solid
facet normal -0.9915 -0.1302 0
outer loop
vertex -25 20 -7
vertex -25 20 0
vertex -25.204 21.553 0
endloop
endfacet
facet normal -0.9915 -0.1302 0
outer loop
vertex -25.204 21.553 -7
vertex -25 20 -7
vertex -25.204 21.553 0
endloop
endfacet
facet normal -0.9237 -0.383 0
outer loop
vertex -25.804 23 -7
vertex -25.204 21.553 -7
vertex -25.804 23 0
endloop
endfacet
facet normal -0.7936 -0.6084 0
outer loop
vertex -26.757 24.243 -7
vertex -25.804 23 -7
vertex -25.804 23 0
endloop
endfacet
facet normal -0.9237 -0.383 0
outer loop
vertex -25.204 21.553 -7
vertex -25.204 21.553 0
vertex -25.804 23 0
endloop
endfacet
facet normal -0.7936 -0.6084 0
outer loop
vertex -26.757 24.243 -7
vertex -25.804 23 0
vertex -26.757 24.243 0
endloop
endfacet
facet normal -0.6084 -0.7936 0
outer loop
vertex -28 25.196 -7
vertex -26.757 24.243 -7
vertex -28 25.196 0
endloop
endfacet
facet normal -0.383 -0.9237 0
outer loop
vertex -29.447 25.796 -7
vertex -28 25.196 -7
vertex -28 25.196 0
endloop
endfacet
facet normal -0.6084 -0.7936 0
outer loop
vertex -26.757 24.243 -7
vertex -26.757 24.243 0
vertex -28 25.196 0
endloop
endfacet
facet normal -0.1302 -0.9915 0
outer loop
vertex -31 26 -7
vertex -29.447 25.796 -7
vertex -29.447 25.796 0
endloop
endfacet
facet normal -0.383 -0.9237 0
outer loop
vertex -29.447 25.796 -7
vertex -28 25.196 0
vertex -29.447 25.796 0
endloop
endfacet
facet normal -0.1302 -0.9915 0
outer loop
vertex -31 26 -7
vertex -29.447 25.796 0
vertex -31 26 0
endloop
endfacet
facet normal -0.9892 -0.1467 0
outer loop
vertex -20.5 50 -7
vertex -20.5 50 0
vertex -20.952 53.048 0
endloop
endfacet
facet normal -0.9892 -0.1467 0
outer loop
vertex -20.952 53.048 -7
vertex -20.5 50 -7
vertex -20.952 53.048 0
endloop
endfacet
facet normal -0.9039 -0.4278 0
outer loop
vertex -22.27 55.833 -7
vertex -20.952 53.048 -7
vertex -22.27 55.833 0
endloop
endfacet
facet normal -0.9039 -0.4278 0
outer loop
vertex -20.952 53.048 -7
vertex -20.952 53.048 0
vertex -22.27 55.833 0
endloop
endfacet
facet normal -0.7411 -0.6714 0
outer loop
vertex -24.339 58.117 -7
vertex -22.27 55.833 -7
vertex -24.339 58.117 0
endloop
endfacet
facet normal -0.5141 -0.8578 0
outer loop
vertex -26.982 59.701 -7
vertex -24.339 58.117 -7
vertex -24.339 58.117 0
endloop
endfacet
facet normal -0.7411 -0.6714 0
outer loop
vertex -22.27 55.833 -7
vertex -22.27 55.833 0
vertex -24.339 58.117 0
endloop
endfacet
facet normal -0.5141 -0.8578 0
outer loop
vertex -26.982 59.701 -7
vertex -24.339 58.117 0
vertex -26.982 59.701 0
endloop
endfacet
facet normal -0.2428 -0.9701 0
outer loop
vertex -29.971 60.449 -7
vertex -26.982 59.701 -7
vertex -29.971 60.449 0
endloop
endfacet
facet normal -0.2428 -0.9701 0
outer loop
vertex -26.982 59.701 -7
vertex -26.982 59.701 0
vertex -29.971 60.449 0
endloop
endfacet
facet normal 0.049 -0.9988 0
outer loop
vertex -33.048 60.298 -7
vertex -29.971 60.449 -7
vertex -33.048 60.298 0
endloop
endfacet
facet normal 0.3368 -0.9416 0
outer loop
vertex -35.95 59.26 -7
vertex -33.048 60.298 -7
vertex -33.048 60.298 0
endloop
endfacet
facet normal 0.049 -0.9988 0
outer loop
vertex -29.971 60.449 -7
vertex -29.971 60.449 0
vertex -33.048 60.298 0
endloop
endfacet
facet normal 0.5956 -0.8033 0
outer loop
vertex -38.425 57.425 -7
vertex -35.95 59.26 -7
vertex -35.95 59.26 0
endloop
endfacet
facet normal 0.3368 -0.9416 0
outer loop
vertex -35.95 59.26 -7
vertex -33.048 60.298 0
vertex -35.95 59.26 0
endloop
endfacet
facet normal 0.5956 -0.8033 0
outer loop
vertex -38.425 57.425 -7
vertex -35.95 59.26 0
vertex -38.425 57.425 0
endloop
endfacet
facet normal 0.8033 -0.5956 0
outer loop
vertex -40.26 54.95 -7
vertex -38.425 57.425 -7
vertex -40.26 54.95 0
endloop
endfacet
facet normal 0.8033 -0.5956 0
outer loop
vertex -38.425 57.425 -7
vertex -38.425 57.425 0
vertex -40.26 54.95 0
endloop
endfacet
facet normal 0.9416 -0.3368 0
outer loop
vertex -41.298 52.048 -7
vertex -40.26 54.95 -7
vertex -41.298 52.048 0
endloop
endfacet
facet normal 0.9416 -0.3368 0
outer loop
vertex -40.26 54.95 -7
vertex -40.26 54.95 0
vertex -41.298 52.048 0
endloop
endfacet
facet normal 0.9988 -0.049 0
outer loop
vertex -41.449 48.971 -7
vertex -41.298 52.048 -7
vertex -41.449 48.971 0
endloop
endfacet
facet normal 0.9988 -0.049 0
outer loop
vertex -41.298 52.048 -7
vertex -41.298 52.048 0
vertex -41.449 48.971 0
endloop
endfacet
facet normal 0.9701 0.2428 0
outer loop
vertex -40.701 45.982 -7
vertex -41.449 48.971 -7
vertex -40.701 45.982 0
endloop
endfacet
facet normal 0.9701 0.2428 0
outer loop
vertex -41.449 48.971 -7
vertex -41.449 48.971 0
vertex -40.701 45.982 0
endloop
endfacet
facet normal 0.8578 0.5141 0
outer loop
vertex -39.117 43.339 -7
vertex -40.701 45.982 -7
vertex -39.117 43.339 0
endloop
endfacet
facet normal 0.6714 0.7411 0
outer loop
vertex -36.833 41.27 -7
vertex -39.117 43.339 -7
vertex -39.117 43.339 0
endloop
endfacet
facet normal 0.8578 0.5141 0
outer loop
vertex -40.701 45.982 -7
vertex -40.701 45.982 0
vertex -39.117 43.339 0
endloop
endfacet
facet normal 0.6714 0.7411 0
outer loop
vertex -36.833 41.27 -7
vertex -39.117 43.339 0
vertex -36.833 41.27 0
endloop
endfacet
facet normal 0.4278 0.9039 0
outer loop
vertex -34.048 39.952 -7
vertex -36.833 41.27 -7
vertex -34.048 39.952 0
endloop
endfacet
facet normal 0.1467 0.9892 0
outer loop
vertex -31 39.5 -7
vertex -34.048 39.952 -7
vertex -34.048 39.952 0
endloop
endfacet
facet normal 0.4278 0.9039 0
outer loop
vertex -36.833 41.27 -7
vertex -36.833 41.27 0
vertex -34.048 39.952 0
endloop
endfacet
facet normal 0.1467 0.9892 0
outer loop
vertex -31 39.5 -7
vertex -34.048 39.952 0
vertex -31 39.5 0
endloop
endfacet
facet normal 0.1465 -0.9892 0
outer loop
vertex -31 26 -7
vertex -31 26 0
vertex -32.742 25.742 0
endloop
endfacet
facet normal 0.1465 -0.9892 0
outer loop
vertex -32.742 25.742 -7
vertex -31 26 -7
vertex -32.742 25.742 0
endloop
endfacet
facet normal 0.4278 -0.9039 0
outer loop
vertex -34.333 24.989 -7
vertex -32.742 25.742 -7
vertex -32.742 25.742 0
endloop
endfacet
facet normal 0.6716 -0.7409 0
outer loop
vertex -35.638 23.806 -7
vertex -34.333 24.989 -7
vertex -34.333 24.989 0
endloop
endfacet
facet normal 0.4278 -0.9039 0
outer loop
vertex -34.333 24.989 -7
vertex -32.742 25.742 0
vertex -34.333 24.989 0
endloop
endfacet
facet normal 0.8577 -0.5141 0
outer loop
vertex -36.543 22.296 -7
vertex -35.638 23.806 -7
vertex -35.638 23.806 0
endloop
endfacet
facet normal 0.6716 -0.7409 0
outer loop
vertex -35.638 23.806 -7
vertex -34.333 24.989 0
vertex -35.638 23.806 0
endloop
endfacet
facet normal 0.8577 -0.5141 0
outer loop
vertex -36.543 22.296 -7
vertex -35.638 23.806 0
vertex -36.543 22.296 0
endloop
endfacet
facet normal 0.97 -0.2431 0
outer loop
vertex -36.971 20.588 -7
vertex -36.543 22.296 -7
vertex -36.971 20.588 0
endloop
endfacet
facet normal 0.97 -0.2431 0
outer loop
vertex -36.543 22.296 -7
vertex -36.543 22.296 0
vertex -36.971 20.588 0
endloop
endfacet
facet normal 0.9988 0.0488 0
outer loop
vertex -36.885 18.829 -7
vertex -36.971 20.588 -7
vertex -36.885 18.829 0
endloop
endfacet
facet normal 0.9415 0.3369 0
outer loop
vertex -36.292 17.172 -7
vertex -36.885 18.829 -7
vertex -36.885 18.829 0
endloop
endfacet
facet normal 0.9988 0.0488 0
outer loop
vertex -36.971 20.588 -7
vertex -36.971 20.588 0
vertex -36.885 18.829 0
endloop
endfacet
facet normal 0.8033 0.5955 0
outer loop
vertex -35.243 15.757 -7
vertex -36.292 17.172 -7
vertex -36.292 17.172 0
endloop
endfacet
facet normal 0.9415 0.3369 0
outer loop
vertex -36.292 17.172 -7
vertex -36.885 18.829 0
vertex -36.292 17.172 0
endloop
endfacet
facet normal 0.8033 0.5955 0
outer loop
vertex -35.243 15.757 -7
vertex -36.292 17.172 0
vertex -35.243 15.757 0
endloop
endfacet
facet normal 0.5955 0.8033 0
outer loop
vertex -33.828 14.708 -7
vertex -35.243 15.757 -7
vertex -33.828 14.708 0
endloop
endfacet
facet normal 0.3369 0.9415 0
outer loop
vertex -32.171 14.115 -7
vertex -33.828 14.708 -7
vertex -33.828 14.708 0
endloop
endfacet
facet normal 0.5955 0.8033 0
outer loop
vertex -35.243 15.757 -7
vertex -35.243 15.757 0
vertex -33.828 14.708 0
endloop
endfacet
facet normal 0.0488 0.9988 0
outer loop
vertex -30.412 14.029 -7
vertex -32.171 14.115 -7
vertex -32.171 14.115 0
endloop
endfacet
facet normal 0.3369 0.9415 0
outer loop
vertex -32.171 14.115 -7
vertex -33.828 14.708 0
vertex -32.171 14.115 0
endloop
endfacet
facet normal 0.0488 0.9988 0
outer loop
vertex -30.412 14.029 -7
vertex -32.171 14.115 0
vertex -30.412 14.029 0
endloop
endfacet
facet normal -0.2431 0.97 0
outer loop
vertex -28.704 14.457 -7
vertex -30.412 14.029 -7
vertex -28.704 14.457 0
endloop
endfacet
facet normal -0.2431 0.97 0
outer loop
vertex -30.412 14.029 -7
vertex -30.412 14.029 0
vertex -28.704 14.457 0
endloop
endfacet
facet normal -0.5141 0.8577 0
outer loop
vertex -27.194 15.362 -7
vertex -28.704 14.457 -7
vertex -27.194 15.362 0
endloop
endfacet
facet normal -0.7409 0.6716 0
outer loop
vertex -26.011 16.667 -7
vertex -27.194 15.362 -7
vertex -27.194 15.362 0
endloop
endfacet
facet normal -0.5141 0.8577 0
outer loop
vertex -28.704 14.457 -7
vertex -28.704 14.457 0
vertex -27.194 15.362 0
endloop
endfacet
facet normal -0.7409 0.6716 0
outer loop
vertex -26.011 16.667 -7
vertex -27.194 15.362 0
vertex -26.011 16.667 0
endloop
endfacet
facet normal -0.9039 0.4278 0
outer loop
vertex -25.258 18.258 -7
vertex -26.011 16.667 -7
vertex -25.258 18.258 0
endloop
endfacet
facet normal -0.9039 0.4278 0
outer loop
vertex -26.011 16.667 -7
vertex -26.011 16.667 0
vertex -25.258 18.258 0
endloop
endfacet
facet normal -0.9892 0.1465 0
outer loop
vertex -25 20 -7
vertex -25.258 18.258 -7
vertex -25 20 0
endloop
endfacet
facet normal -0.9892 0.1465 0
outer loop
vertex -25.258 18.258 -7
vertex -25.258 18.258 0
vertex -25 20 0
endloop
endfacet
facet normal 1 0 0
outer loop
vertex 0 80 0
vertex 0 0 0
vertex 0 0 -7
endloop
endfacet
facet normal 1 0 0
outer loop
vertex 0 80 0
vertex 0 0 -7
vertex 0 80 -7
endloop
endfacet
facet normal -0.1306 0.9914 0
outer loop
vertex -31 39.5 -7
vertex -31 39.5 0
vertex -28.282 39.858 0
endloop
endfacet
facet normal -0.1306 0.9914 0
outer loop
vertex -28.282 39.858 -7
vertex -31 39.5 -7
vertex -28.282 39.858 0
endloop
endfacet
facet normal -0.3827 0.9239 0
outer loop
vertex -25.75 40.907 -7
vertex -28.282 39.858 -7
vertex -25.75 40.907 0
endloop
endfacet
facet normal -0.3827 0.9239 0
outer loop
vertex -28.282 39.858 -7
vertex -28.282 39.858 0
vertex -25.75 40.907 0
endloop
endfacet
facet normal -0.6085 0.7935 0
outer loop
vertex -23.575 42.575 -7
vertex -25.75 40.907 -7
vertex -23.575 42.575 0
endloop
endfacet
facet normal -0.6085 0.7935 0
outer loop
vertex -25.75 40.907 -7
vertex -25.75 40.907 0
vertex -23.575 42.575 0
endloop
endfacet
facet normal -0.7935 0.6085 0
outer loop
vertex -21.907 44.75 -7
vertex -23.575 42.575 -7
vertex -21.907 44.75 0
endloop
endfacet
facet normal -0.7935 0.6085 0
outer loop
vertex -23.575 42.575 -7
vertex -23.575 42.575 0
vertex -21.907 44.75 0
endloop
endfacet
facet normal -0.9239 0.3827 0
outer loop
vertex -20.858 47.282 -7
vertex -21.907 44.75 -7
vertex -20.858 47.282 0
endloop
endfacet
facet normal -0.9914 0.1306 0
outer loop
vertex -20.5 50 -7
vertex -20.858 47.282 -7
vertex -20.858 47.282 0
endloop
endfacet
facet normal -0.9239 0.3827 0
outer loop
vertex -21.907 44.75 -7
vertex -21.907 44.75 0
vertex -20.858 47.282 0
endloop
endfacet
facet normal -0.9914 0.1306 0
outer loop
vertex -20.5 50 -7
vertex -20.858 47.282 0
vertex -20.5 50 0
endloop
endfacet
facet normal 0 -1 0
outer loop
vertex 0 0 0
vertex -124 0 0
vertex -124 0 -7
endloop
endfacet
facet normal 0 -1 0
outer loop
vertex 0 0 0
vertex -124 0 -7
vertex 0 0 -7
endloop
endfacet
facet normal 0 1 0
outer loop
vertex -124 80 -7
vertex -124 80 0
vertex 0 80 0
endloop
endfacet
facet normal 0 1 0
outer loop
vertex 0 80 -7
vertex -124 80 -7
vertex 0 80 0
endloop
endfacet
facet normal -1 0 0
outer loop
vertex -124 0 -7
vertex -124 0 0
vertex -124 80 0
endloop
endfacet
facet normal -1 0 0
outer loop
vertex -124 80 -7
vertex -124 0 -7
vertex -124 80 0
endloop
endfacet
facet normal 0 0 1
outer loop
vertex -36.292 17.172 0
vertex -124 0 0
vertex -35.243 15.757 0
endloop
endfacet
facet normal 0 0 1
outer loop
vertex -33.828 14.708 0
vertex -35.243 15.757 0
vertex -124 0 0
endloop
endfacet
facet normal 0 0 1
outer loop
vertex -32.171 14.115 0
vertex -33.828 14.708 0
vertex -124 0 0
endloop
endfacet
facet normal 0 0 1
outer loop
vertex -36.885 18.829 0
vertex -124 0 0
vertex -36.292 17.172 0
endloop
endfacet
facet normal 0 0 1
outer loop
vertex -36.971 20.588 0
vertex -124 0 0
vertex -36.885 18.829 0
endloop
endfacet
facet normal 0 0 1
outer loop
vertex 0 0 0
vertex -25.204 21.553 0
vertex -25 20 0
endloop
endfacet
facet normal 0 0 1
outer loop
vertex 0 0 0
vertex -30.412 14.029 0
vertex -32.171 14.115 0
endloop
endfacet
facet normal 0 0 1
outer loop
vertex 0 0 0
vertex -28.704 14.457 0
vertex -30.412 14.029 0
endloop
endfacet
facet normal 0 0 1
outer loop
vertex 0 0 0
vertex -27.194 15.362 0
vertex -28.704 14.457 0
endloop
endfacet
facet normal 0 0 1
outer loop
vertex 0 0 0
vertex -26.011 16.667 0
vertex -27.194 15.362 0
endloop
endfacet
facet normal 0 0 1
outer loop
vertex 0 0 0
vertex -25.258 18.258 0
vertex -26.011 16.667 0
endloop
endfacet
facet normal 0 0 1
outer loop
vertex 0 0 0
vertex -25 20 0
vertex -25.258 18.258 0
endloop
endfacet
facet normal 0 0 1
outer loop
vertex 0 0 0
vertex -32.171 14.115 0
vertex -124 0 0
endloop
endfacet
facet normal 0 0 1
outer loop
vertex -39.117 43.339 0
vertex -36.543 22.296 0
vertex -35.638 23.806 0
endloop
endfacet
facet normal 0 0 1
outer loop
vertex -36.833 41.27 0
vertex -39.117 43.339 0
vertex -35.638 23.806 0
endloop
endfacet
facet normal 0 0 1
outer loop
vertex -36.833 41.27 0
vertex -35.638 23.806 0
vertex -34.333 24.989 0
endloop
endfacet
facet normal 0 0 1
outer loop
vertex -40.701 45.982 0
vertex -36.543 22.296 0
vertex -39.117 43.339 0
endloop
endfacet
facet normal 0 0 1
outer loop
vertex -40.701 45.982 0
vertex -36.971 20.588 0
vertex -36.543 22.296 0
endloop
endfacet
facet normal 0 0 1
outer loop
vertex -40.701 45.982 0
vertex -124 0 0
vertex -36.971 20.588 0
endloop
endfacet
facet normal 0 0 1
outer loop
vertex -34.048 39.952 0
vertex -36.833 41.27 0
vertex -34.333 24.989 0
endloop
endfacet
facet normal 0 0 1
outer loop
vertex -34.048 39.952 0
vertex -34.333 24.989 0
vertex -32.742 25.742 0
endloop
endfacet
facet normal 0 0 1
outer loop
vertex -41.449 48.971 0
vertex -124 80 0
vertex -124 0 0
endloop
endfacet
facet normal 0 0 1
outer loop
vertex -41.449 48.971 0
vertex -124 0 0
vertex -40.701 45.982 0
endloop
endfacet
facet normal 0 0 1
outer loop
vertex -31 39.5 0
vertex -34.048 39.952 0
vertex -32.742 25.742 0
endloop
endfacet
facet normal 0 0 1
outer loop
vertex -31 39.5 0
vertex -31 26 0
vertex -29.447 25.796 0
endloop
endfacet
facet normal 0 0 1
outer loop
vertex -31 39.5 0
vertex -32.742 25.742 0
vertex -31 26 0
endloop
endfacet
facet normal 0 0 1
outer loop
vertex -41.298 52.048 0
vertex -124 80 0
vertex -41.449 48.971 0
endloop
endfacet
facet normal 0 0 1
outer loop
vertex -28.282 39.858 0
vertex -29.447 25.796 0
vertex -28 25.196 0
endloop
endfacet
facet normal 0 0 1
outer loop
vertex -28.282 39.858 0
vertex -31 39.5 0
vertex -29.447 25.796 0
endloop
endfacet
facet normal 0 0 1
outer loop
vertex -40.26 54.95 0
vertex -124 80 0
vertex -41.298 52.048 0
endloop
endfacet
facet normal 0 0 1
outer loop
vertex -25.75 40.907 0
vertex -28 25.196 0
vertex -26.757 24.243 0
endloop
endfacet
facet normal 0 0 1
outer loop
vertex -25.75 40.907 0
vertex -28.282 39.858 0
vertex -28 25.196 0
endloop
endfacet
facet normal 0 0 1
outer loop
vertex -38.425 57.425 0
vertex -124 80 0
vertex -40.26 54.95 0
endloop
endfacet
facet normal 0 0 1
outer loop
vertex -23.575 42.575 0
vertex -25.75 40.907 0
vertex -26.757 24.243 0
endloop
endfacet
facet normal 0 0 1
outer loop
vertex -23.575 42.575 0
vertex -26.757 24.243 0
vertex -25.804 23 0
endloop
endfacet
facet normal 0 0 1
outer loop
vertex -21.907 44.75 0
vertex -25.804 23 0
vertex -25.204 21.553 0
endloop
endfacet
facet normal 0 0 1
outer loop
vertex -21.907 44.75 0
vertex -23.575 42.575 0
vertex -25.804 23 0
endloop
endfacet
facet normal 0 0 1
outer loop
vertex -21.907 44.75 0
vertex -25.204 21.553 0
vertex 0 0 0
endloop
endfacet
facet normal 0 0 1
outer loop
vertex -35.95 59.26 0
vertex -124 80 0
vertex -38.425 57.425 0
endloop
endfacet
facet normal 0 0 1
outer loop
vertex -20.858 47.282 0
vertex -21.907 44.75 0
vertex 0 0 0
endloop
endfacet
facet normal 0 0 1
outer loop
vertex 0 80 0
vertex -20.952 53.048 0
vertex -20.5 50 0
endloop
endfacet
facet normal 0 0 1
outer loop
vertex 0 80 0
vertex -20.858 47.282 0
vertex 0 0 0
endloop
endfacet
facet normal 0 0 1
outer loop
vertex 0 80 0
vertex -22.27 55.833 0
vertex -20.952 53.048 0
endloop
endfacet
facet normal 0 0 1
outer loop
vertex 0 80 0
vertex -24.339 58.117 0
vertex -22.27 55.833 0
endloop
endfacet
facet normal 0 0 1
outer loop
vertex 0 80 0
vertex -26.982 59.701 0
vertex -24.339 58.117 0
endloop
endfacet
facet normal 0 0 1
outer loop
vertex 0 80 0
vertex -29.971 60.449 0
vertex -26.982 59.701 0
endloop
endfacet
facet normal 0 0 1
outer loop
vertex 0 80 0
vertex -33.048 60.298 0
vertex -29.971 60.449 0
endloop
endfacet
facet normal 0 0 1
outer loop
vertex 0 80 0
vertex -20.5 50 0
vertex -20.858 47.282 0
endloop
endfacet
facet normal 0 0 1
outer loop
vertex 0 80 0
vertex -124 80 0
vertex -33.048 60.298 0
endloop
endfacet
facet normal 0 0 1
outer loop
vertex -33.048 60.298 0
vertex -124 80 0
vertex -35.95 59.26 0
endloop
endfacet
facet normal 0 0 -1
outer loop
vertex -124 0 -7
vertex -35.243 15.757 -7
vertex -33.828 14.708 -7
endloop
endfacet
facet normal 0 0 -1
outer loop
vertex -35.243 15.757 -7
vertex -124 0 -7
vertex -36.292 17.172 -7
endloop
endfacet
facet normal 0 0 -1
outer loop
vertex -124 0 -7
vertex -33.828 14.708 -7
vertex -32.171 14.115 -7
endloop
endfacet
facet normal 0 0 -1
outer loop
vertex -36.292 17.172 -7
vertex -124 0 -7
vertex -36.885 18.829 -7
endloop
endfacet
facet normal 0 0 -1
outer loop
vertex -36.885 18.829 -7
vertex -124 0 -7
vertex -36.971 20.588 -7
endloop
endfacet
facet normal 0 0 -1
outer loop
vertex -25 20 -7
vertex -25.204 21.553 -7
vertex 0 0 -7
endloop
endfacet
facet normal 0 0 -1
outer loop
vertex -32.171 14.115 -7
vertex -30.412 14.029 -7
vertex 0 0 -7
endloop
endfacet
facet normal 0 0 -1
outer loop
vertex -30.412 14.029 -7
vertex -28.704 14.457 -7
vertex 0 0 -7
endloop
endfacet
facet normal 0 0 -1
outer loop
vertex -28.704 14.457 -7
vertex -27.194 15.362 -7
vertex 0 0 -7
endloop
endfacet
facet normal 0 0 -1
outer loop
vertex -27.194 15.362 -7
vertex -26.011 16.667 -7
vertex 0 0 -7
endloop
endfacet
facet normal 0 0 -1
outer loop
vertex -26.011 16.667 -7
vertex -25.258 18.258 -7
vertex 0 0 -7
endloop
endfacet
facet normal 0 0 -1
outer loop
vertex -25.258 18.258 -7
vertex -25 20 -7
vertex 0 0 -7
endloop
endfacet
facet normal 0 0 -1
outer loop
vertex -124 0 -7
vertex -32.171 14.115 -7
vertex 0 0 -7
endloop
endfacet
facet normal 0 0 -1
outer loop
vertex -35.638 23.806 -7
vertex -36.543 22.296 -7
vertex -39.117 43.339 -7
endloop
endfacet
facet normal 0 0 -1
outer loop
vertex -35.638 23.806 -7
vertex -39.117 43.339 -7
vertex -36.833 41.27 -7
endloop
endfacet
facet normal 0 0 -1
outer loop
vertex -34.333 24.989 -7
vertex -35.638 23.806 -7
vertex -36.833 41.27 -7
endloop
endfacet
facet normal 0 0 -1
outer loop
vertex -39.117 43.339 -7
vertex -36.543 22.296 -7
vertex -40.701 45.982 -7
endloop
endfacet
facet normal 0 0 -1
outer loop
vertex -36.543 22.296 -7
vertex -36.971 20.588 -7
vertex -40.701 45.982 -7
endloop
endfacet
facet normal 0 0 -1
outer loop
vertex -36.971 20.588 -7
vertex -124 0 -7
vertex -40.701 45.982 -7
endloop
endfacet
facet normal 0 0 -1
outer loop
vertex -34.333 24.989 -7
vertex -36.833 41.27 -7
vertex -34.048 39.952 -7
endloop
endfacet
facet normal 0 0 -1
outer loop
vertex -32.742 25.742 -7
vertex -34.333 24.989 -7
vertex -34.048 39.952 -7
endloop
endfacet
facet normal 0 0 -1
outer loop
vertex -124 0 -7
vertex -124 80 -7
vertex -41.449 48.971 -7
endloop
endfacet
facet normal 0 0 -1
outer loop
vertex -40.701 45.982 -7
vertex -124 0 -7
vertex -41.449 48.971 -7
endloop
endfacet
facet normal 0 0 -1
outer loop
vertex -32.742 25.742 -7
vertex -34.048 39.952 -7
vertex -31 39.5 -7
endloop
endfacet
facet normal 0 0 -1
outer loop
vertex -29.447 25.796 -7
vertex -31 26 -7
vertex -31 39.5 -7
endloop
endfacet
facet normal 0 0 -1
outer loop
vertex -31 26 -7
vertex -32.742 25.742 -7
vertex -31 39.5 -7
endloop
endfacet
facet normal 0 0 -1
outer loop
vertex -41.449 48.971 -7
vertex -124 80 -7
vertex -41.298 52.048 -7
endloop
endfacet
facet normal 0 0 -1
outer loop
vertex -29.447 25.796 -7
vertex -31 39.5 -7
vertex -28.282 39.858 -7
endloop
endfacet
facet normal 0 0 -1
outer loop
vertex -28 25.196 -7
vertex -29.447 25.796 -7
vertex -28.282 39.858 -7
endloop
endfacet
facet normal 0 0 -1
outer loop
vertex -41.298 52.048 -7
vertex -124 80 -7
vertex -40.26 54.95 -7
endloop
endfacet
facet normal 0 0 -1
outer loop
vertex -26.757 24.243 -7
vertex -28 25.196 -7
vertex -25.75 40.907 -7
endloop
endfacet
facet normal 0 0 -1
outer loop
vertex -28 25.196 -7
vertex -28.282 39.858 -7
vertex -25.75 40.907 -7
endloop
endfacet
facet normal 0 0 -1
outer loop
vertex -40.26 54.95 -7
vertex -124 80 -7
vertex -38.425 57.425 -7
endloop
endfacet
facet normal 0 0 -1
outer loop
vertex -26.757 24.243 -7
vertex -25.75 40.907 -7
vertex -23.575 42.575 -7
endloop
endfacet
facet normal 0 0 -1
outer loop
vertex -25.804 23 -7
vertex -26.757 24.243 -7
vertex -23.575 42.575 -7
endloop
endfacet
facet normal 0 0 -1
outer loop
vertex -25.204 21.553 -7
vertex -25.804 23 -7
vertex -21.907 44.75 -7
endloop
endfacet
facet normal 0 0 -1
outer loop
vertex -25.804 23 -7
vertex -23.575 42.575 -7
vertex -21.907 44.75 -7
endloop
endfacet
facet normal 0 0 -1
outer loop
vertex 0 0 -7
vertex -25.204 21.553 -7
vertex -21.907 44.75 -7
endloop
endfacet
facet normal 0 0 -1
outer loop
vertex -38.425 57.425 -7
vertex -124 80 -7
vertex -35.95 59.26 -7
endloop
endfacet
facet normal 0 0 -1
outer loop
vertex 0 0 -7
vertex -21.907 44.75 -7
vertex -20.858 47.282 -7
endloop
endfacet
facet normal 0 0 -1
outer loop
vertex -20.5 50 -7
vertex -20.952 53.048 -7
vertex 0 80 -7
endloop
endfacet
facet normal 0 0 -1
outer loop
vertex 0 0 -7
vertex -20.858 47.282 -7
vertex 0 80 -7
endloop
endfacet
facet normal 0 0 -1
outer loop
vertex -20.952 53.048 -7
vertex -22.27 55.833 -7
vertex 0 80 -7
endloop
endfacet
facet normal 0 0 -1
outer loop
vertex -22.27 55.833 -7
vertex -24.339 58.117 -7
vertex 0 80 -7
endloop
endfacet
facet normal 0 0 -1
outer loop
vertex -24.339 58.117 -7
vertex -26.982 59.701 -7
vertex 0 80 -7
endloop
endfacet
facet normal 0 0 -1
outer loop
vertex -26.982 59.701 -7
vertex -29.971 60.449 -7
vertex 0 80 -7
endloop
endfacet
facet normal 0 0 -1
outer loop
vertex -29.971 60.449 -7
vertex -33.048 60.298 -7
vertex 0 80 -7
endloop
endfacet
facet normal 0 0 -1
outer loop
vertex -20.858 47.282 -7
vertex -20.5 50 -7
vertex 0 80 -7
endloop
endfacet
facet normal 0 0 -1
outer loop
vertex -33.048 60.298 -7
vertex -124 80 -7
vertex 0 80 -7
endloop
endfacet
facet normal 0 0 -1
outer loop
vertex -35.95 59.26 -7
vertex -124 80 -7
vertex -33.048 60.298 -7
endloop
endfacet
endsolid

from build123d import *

# Parameters (mm, degrees)
F0_W     = 124
F0_H     = 80
F1_DEPTH = 7
F5_DEPTH = 25


with BuildPart() as f1:
    # F0 (on Top) → F1 (new body)
    with BuildSketch(Plane.XY):
        with Locations((-62, 40)):
            Rectangle(F0_W, F0_H)
    extrude(amount=-F1_DEPTH)


with BuildPart() as f2_1:
    # F2: copy of F1
    add(f1.part)

    # F4 (on face) → F5 (cut)
    with BuildSketch(Plane.XY):
        with BuildLine():
            ThreePointArc((-20.5, 50), (-38.424621, 57.424621), (-31, 39.5))
            ThreePointArc((-31, 39.5), (-23.575379, 42.575379), (-20.5, 50))
        make_face()
        with BuildLine():
            ThreePointArc((-25, 20), (-26.757359, 24.242641), (-31, 26))
            ThreePointArc((-31, 26), (-35.242641, 15.757359), (-25, 20))
        make_face()
    extrude(amount=-F5_DEPTH, mode=Mode.SUBTRACT)


solid = f2_1.part
